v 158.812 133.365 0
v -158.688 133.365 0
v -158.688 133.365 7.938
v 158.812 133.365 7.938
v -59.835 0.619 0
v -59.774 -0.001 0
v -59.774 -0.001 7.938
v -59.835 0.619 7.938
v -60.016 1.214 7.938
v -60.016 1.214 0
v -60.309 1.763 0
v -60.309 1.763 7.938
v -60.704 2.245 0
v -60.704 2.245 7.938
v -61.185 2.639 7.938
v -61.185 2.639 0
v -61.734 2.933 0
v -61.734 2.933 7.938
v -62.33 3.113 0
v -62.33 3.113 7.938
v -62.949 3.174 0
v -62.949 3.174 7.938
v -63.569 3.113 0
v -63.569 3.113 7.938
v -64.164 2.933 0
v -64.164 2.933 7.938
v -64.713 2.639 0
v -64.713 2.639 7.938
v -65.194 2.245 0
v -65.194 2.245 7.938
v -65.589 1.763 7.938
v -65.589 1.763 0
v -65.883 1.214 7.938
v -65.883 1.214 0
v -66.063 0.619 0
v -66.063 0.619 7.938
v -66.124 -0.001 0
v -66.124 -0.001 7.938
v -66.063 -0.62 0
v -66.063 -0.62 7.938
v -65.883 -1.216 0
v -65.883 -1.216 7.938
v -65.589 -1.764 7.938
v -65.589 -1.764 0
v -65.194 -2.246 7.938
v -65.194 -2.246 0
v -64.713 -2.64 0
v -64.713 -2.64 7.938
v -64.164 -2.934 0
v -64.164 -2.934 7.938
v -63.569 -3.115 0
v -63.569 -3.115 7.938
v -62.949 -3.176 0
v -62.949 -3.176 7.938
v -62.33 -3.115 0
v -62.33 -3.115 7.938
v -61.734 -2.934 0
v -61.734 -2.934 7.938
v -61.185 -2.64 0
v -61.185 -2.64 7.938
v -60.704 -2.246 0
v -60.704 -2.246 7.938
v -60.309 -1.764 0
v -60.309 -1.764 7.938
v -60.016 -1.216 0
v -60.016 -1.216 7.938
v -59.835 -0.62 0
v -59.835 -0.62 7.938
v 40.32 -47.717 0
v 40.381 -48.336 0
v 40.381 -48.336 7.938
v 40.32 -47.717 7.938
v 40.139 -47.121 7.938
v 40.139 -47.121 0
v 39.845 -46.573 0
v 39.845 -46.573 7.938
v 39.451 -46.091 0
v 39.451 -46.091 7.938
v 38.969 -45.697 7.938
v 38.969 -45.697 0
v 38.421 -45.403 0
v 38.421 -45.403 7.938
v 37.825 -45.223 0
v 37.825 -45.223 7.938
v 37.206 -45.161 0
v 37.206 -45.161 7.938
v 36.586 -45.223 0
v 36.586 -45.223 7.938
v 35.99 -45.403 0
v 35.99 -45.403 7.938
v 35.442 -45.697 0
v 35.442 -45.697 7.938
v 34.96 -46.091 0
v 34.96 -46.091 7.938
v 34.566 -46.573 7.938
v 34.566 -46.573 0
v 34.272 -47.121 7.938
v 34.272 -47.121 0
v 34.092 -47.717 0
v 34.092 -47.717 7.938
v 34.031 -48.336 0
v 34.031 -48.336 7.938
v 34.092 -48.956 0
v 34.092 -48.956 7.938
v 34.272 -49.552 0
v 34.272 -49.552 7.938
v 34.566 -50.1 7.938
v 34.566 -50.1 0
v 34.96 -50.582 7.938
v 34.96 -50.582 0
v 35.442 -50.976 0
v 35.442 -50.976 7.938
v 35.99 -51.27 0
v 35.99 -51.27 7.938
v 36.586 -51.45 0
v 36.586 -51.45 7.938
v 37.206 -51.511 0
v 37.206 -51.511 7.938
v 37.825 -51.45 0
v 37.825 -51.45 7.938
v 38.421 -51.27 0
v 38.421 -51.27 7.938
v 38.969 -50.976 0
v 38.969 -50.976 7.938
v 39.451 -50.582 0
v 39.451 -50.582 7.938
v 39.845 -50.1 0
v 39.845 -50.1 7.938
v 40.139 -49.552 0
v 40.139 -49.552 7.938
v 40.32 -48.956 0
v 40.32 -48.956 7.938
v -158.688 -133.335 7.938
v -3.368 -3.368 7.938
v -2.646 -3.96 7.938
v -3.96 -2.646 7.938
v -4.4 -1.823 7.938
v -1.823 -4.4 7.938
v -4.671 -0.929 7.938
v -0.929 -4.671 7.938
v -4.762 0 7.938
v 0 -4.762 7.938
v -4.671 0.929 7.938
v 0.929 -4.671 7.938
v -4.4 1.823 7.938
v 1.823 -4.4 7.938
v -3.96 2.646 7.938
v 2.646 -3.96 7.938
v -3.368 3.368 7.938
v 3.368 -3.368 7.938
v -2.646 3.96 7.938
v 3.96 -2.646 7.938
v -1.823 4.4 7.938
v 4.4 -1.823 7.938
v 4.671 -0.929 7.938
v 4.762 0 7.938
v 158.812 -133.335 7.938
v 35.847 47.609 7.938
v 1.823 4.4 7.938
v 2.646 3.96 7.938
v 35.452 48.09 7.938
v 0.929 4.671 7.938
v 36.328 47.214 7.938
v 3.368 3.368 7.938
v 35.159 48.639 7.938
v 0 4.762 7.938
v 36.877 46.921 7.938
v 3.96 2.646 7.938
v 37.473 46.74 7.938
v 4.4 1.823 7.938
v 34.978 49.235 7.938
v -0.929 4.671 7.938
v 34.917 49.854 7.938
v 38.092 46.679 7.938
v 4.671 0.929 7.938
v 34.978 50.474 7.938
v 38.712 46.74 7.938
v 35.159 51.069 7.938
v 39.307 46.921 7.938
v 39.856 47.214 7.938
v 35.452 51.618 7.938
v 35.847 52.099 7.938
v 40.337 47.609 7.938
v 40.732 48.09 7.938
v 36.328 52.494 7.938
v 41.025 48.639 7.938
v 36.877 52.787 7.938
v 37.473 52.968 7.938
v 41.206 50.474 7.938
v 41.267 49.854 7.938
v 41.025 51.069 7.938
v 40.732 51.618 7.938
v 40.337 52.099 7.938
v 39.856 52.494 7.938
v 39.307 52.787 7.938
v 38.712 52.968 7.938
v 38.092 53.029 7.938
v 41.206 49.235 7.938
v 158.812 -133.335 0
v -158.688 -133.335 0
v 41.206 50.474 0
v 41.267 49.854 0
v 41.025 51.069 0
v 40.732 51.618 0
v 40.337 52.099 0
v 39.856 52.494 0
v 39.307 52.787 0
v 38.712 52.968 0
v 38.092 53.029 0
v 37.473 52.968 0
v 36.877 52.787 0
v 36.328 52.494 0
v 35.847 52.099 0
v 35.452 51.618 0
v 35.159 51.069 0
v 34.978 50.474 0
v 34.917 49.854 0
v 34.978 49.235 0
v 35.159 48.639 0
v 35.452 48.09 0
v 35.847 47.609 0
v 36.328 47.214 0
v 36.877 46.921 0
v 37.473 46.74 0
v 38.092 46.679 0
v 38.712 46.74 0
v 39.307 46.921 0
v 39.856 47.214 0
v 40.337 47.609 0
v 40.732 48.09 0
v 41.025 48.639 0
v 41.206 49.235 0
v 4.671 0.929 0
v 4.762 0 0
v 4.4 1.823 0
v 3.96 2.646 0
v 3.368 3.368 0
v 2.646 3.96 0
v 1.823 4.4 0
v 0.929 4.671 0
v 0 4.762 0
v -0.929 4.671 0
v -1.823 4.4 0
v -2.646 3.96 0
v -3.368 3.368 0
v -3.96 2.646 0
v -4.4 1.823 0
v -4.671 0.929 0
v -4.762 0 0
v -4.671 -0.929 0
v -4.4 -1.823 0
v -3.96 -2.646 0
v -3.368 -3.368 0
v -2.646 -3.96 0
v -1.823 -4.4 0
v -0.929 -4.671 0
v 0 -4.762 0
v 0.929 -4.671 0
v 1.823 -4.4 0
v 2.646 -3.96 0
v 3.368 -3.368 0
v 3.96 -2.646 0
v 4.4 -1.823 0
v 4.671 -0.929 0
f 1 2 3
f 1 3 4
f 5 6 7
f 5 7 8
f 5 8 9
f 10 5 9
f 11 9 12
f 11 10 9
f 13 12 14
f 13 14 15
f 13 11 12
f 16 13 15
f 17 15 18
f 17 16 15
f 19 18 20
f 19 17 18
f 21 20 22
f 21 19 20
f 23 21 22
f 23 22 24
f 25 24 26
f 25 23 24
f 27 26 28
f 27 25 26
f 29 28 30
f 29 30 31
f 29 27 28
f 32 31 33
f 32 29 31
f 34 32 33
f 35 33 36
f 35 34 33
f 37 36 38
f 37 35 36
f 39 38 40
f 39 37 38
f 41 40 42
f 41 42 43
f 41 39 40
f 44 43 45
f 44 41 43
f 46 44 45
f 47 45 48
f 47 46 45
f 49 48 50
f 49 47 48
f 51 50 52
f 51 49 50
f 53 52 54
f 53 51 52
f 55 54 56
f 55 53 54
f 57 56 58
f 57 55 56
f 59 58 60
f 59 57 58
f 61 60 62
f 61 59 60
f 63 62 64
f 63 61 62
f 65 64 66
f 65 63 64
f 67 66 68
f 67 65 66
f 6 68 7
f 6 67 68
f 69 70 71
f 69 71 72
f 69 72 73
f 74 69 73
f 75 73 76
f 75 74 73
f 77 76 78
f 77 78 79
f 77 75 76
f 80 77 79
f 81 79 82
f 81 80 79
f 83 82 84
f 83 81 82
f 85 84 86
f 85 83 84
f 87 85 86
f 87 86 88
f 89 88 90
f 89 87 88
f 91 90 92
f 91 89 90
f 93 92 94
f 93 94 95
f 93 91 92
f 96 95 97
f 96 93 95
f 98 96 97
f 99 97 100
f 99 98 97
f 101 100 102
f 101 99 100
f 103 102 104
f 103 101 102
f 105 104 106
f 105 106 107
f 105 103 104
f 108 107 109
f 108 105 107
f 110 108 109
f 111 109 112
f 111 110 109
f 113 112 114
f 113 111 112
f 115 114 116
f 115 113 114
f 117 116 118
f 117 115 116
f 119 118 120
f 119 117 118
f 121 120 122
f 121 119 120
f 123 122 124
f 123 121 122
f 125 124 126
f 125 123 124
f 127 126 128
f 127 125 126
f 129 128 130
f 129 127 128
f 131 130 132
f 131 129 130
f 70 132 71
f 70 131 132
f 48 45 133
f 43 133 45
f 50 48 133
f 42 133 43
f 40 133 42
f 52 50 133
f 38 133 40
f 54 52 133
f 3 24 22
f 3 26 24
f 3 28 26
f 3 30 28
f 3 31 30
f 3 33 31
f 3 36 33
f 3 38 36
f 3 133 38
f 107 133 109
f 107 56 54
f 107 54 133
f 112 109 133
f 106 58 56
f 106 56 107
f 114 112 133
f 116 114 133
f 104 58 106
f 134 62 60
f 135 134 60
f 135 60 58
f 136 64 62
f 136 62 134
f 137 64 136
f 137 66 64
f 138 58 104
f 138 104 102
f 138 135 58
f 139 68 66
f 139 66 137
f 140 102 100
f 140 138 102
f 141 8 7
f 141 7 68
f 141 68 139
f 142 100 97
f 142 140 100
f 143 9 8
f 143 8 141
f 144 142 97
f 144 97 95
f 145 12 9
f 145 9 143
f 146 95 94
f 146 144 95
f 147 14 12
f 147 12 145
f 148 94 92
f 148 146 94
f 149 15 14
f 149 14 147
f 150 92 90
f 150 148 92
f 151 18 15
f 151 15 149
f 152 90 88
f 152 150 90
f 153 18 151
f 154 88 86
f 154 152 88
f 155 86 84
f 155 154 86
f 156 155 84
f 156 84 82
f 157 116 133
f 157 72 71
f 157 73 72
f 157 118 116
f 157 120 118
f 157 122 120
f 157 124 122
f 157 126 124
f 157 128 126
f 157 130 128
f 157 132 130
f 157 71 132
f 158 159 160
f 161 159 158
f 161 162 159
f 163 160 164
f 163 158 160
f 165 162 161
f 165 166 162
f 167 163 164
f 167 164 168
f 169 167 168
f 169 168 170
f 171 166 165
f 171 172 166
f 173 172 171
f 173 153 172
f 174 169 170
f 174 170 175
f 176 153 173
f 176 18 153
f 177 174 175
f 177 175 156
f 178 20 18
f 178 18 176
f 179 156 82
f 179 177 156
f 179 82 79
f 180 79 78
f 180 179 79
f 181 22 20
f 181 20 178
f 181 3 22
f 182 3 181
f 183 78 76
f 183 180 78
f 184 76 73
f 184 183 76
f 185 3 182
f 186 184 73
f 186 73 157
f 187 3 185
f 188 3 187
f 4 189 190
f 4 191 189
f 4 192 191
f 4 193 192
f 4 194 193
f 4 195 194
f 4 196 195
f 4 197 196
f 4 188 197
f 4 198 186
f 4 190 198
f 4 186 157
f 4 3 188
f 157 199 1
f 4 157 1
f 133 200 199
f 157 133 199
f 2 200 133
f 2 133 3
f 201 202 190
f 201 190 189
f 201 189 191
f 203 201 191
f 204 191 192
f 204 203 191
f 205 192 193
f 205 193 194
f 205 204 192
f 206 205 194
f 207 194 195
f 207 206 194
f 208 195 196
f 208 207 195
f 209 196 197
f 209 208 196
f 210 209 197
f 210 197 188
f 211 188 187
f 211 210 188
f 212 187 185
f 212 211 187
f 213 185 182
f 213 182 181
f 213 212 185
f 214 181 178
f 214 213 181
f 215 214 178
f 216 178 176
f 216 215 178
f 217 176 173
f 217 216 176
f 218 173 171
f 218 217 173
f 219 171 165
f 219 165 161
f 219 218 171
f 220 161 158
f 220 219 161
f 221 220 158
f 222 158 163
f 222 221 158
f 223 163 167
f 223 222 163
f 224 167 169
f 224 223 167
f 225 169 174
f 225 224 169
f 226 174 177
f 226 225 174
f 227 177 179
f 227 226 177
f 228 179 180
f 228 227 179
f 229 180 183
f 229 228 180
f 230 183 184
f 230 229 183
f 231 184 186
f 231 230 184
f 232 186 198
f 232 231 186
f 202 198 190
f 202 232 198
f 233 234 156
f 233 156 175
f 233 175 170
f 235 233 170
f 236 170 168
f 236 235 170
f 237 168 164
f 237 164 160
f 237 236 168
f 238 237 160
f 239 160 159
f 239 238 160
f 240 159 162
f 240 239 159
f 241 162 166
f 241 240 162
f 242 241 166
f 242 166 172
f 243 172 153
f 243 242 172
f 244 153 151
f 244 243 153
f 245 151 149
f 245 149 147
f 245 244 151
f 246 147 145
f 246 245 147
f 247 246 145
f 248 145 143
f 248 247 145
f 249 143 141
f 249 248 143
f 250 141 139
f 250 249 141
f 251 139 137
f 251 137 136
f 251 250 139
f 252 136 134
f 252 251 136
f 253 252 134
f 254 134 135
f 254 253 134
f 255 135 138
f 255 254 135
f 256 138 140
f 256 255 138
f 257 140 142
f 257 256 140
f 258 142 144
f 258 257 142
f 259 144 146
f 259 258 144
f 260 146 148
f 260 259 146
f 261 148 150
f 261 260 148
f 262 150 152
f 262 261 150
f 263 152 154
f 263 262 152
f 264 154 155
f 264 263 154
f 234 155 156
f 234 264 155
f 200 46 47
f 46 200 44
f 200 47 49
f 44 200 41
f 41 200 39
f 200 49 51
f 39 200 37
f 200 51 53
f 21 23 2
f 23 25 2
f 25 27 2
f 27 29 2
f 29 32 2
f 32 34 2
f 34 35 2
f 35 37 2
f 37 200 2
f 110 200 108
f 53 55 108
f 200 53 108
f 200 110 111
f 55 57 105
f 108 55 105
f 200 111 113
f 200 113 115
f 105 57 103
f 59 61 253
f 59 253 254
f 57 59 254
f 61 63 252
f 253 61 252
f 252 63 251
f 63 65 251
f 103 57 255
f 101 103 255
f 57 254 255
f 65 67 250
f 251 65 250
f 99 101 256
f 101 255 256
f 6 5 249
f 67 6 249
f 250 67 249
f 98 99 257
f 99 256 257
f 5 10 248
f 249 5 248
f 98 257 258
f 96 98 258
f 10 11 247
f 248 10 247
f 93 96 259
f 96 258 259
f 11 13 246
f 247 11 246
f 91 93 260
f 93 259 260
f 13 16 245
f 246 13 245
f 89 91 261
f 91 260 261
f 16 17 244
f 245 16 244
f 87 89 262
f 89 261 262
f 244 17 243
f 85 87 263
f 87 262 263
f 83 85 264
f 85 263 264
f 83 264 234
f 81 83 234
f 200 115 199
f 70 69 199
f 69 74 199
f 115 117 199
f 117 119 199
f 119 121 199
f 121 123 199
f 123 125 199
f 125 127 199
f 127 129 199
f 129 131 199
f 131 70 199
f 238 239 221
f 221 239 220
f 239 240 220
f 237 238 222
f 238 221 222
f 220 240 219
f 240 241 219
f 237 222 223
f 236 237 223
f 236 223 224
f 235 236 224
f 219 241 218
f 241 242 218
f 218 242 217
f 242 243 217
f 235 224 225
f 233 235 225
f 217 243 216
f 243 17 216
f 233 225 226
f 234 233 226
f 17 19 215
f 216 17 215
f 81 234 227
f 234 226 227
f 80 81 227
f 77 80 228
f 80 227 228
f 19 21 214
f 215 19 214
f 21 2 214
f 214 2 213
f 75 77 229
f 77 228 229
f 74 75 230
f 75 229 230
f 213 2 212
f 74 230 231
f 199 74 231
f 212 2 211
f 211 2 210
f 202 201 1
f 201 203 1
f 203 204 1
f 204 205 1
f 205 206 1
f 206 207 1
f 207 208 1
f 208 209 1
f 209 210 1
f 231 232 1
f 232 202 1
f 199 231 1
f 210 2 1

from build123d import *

# Parameters (mm, degrees)
F0_W     = 317.5
F0_H     = 266.7
F0_R     = 3.175
F0_R_2   = 4.7625
F1_DEPTH = 7.9375


# Not quite as in the source:
# - a feature names something its author has since deleted; it is built from what else it names


with BuildPart() as f1:
    # F0 (on Top) → F1 (new body)
    with BuildSketch(Plane.XY):
        with Locations((0.0623334384, 0.0151203394)):
            Rectangle(F0_W, F0_H)
        with Locations((-62.9493173903, -0.0005464993)):
            Circle(F0_R, mode=Mode.SUBTRACT)
        Circle(F0_R_2, mode=Mode.SUBTRACT)
        with Locations((37.2055072098, -48.3364977443)):
            Circle(F0_R, mode=Mode.SUBTRACT)
        with Locations((38.0921348072, 49.8540893279)):
            Circle(F0_R, mode=Mode.SUBTRACT)
    extrude(amount=F1_DEPTH)


solid = f1.part
